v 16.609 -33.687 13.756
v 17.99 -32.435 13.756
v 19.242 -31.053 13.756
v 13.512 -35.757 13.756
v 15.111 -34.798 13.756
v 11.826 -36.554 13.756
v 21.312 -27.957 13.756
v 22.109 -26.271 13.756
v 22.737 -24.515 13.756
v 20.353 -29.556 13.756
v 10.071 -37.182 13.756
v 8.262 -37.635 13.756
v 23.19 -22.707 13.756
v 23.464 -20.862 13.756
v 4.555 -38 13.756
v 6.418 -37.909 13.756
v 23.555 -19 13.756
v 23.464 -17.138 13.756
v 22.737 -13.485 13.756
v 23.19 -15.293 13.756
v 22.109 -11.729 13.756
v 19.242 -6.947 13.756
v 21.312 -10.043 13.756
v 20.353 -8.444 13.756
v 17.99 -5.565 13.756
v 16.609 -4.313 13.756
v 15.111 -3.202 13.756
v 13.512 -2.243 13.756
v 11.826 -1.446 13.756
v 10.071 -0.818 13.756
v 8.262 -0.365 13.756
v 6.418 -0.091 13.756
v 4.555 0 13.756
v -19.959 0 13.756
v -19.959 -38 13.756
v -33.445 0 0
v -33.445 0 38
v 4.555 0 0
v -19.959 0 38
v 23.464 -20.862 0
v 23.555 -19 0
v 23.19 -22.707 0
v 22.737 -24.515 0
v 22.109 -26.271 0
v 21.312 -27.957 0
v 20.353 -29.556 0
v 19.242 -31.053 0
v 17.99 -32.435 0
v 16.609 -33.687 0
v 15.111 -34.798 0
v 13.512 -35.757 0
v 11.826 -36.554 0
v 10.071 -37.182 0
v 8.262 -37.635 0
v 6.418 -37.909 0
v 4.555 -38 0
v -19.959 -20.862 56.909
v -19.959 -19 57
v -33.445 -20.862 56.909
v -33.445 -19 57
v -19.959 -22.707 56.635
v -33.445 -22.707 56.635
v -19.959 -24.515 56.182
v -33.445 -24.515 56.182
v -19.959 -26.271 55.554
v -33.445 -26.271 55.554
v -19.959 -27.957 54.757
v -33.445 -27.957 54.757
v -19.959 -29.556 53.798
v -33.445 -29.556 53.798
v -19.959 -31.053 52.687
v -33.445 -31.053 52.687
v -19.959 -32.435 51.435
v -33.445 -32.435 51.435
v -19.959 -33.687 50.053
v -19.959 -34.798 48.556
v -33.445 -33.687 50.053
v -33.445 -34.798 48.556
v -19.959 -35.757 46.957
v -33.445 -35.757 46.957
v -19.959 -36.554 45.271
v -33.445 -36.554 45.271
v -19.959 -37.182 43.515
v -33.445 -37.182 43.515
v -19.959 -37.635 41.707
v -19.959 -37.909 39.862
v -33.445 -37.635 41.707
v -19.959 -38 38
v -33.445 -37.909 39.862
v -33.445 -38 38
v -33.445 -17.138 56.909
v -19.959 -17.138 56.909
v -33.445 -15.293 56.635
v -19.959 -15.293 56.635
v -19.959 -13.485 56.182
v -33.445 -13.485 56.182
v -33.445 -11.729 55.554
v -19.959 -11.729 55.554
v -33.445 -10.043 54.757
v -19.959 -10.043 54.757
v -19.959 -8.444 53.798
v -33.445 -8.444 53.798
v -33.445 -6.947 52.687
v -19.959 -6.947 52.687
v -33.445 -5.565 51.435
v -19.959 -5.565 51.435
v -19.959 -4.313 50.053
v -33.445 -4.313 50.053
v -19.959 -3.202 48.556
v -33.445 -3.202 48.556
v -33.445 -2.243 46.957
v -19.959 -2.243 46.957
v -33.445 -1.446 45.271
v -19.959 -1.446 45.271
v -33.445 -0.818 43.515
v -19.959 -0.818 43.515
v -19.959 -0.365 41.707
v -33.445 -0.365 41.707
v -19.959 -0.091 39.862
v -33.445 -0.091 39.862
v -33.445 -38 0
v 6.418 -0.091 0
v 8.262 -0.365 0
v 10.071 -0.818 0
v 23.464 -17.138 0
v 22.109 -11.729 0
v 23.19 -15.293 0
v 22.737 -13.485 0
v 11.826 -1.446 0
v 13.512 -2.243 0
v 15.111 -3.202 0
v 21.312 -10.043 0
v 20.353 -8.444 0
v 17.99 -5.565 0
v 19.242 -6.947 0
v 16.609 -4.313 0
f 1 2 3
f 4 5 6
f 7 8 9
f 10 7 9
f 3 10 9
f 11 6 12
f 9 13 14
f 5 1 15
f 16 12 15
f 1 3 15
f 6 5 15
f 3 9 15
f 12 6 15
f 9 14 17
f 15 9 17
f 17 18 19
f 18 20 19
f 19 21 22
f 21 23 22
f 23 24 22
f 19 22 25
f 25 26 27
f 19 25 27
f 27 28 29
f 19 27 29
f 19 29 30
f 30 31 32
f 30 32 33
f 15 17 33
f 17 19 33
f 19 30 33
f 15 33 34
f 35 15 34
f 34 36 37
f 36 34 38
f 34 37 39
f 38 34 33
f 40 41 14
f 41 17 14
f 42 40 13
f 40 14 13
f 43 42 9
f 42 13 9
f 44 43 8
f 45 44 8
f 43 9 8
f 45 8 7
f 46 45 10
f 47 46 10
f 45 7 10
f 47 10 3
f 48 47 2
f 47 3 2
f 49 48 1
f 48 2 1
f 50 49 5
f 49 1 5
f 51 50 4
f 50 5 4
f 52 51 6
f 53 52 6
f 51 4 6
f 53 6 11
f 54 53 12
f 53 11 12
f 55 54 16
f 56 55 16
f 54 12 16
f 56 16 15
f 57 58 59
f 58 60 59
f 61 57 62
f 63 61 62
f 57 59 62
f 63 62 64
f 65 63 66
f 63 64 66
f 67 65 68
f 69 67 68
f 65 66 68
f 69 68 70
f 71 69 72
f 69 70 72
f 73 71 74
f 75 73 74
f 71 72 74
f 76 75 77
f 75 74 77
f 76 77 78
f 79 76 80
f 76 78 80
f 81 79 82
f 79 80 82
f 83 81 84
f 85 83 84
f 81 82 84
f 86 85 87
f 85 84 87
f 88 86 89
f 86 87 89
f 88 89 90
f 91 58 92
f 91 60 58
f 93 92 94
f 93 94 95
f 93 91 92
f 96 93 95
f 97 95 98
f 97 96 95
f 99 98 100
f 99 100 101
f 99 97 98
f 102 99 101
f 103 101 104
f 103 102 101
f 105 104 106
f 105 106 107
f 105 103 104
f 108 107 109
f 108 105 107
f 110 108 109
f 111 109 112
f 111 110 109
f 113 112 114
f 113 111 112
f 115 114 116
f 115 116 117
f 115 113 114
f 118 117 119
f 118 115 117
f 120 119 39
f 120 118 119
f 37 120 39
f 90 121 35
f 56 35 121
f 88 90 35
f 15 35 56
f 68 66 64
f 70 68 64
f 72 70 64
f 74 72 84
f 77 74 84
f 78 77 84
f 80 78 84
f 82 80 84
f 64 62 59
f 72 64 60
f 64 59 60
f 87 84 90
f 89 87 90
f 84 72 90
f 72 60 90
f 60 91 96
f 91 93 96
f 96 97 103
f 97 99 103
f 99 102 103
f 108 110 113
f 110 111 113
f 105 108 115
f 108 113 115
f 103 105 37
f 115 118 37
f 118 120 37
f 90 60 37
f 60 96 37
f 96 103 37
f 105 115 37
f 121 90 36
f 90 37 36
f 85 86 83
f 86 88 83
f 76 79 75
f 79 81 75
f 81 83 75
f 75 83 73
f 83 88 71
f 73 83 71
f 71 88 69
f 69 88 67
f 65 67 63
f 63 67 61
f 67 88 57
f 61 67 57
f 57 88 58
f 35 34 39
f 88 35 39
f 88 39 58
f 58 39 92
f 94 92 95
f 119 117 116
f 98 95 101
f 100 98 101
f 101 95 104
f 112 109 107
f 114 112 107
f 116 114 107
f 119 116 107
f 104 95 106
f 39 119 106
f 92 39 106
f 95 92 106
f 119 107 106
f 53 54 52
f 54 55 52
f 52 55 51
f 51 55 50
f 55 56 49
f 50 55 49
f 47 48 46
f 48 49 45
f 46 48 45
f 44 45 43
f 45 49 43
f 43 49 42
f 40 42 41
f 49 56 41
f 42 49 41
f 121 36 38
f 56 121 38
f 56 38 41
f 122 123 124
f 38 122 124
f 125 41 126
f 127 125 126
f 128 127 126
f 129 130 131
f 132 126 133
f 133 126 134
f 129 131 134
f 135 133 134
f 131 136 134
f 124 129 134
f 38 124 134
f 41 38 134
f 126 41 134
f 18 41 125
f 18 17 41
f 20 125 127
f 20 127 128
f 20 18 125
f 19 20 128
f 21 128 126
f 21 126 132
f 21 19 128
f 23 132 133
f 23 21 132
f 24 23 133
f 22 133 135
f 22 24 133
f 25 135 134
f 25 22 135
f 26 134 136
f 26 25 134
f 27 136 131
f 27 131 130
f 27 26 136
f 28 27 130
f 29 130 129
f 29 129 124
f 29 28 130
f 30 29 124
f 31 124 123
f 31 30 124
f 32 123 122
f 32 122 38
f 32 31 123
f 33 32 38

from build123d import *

# Parameters (mm, degrees)
F1_DEPTH = 38
F2_R     = 18.99999


# Not quite as in the source:
# - a fillet or chamfer is up to 0.001 mm smaller than in the source, because OpenCascade refuses the exact size


with BuildPart() as f1:
    # F0 (on Front) → F1 (new body)
    with BuildSketch(Plane.XZ):
        Polygon((-19.9589891719, 57), (-33.4447937101, 57), (-33.4447937101, 13.7555195992), (-33.4447937101, 0), (-19.9589891719, 0), (23.5552062899, 0), (23.5552062899, 13.7555195992), (-19.9589891719, 13.7555195992), align=None)
    extrude(amount=F1_DEPTH)

    # F2 (radius 19 in the source; OpenCascade refuses exactly that, so slightly less here)
    f2_edges = [f1.edges().sort_by_distance(p)[0] for p in [
        (-26.701891, -38, 57),
        (-26.701891, 0, 57),
        (23.555206, 0, 6.87776),
        (23.555206, -38, 6.87776),
    ]]
    fillet(f2_edges, radius=F2_R)


solid = f1.part
